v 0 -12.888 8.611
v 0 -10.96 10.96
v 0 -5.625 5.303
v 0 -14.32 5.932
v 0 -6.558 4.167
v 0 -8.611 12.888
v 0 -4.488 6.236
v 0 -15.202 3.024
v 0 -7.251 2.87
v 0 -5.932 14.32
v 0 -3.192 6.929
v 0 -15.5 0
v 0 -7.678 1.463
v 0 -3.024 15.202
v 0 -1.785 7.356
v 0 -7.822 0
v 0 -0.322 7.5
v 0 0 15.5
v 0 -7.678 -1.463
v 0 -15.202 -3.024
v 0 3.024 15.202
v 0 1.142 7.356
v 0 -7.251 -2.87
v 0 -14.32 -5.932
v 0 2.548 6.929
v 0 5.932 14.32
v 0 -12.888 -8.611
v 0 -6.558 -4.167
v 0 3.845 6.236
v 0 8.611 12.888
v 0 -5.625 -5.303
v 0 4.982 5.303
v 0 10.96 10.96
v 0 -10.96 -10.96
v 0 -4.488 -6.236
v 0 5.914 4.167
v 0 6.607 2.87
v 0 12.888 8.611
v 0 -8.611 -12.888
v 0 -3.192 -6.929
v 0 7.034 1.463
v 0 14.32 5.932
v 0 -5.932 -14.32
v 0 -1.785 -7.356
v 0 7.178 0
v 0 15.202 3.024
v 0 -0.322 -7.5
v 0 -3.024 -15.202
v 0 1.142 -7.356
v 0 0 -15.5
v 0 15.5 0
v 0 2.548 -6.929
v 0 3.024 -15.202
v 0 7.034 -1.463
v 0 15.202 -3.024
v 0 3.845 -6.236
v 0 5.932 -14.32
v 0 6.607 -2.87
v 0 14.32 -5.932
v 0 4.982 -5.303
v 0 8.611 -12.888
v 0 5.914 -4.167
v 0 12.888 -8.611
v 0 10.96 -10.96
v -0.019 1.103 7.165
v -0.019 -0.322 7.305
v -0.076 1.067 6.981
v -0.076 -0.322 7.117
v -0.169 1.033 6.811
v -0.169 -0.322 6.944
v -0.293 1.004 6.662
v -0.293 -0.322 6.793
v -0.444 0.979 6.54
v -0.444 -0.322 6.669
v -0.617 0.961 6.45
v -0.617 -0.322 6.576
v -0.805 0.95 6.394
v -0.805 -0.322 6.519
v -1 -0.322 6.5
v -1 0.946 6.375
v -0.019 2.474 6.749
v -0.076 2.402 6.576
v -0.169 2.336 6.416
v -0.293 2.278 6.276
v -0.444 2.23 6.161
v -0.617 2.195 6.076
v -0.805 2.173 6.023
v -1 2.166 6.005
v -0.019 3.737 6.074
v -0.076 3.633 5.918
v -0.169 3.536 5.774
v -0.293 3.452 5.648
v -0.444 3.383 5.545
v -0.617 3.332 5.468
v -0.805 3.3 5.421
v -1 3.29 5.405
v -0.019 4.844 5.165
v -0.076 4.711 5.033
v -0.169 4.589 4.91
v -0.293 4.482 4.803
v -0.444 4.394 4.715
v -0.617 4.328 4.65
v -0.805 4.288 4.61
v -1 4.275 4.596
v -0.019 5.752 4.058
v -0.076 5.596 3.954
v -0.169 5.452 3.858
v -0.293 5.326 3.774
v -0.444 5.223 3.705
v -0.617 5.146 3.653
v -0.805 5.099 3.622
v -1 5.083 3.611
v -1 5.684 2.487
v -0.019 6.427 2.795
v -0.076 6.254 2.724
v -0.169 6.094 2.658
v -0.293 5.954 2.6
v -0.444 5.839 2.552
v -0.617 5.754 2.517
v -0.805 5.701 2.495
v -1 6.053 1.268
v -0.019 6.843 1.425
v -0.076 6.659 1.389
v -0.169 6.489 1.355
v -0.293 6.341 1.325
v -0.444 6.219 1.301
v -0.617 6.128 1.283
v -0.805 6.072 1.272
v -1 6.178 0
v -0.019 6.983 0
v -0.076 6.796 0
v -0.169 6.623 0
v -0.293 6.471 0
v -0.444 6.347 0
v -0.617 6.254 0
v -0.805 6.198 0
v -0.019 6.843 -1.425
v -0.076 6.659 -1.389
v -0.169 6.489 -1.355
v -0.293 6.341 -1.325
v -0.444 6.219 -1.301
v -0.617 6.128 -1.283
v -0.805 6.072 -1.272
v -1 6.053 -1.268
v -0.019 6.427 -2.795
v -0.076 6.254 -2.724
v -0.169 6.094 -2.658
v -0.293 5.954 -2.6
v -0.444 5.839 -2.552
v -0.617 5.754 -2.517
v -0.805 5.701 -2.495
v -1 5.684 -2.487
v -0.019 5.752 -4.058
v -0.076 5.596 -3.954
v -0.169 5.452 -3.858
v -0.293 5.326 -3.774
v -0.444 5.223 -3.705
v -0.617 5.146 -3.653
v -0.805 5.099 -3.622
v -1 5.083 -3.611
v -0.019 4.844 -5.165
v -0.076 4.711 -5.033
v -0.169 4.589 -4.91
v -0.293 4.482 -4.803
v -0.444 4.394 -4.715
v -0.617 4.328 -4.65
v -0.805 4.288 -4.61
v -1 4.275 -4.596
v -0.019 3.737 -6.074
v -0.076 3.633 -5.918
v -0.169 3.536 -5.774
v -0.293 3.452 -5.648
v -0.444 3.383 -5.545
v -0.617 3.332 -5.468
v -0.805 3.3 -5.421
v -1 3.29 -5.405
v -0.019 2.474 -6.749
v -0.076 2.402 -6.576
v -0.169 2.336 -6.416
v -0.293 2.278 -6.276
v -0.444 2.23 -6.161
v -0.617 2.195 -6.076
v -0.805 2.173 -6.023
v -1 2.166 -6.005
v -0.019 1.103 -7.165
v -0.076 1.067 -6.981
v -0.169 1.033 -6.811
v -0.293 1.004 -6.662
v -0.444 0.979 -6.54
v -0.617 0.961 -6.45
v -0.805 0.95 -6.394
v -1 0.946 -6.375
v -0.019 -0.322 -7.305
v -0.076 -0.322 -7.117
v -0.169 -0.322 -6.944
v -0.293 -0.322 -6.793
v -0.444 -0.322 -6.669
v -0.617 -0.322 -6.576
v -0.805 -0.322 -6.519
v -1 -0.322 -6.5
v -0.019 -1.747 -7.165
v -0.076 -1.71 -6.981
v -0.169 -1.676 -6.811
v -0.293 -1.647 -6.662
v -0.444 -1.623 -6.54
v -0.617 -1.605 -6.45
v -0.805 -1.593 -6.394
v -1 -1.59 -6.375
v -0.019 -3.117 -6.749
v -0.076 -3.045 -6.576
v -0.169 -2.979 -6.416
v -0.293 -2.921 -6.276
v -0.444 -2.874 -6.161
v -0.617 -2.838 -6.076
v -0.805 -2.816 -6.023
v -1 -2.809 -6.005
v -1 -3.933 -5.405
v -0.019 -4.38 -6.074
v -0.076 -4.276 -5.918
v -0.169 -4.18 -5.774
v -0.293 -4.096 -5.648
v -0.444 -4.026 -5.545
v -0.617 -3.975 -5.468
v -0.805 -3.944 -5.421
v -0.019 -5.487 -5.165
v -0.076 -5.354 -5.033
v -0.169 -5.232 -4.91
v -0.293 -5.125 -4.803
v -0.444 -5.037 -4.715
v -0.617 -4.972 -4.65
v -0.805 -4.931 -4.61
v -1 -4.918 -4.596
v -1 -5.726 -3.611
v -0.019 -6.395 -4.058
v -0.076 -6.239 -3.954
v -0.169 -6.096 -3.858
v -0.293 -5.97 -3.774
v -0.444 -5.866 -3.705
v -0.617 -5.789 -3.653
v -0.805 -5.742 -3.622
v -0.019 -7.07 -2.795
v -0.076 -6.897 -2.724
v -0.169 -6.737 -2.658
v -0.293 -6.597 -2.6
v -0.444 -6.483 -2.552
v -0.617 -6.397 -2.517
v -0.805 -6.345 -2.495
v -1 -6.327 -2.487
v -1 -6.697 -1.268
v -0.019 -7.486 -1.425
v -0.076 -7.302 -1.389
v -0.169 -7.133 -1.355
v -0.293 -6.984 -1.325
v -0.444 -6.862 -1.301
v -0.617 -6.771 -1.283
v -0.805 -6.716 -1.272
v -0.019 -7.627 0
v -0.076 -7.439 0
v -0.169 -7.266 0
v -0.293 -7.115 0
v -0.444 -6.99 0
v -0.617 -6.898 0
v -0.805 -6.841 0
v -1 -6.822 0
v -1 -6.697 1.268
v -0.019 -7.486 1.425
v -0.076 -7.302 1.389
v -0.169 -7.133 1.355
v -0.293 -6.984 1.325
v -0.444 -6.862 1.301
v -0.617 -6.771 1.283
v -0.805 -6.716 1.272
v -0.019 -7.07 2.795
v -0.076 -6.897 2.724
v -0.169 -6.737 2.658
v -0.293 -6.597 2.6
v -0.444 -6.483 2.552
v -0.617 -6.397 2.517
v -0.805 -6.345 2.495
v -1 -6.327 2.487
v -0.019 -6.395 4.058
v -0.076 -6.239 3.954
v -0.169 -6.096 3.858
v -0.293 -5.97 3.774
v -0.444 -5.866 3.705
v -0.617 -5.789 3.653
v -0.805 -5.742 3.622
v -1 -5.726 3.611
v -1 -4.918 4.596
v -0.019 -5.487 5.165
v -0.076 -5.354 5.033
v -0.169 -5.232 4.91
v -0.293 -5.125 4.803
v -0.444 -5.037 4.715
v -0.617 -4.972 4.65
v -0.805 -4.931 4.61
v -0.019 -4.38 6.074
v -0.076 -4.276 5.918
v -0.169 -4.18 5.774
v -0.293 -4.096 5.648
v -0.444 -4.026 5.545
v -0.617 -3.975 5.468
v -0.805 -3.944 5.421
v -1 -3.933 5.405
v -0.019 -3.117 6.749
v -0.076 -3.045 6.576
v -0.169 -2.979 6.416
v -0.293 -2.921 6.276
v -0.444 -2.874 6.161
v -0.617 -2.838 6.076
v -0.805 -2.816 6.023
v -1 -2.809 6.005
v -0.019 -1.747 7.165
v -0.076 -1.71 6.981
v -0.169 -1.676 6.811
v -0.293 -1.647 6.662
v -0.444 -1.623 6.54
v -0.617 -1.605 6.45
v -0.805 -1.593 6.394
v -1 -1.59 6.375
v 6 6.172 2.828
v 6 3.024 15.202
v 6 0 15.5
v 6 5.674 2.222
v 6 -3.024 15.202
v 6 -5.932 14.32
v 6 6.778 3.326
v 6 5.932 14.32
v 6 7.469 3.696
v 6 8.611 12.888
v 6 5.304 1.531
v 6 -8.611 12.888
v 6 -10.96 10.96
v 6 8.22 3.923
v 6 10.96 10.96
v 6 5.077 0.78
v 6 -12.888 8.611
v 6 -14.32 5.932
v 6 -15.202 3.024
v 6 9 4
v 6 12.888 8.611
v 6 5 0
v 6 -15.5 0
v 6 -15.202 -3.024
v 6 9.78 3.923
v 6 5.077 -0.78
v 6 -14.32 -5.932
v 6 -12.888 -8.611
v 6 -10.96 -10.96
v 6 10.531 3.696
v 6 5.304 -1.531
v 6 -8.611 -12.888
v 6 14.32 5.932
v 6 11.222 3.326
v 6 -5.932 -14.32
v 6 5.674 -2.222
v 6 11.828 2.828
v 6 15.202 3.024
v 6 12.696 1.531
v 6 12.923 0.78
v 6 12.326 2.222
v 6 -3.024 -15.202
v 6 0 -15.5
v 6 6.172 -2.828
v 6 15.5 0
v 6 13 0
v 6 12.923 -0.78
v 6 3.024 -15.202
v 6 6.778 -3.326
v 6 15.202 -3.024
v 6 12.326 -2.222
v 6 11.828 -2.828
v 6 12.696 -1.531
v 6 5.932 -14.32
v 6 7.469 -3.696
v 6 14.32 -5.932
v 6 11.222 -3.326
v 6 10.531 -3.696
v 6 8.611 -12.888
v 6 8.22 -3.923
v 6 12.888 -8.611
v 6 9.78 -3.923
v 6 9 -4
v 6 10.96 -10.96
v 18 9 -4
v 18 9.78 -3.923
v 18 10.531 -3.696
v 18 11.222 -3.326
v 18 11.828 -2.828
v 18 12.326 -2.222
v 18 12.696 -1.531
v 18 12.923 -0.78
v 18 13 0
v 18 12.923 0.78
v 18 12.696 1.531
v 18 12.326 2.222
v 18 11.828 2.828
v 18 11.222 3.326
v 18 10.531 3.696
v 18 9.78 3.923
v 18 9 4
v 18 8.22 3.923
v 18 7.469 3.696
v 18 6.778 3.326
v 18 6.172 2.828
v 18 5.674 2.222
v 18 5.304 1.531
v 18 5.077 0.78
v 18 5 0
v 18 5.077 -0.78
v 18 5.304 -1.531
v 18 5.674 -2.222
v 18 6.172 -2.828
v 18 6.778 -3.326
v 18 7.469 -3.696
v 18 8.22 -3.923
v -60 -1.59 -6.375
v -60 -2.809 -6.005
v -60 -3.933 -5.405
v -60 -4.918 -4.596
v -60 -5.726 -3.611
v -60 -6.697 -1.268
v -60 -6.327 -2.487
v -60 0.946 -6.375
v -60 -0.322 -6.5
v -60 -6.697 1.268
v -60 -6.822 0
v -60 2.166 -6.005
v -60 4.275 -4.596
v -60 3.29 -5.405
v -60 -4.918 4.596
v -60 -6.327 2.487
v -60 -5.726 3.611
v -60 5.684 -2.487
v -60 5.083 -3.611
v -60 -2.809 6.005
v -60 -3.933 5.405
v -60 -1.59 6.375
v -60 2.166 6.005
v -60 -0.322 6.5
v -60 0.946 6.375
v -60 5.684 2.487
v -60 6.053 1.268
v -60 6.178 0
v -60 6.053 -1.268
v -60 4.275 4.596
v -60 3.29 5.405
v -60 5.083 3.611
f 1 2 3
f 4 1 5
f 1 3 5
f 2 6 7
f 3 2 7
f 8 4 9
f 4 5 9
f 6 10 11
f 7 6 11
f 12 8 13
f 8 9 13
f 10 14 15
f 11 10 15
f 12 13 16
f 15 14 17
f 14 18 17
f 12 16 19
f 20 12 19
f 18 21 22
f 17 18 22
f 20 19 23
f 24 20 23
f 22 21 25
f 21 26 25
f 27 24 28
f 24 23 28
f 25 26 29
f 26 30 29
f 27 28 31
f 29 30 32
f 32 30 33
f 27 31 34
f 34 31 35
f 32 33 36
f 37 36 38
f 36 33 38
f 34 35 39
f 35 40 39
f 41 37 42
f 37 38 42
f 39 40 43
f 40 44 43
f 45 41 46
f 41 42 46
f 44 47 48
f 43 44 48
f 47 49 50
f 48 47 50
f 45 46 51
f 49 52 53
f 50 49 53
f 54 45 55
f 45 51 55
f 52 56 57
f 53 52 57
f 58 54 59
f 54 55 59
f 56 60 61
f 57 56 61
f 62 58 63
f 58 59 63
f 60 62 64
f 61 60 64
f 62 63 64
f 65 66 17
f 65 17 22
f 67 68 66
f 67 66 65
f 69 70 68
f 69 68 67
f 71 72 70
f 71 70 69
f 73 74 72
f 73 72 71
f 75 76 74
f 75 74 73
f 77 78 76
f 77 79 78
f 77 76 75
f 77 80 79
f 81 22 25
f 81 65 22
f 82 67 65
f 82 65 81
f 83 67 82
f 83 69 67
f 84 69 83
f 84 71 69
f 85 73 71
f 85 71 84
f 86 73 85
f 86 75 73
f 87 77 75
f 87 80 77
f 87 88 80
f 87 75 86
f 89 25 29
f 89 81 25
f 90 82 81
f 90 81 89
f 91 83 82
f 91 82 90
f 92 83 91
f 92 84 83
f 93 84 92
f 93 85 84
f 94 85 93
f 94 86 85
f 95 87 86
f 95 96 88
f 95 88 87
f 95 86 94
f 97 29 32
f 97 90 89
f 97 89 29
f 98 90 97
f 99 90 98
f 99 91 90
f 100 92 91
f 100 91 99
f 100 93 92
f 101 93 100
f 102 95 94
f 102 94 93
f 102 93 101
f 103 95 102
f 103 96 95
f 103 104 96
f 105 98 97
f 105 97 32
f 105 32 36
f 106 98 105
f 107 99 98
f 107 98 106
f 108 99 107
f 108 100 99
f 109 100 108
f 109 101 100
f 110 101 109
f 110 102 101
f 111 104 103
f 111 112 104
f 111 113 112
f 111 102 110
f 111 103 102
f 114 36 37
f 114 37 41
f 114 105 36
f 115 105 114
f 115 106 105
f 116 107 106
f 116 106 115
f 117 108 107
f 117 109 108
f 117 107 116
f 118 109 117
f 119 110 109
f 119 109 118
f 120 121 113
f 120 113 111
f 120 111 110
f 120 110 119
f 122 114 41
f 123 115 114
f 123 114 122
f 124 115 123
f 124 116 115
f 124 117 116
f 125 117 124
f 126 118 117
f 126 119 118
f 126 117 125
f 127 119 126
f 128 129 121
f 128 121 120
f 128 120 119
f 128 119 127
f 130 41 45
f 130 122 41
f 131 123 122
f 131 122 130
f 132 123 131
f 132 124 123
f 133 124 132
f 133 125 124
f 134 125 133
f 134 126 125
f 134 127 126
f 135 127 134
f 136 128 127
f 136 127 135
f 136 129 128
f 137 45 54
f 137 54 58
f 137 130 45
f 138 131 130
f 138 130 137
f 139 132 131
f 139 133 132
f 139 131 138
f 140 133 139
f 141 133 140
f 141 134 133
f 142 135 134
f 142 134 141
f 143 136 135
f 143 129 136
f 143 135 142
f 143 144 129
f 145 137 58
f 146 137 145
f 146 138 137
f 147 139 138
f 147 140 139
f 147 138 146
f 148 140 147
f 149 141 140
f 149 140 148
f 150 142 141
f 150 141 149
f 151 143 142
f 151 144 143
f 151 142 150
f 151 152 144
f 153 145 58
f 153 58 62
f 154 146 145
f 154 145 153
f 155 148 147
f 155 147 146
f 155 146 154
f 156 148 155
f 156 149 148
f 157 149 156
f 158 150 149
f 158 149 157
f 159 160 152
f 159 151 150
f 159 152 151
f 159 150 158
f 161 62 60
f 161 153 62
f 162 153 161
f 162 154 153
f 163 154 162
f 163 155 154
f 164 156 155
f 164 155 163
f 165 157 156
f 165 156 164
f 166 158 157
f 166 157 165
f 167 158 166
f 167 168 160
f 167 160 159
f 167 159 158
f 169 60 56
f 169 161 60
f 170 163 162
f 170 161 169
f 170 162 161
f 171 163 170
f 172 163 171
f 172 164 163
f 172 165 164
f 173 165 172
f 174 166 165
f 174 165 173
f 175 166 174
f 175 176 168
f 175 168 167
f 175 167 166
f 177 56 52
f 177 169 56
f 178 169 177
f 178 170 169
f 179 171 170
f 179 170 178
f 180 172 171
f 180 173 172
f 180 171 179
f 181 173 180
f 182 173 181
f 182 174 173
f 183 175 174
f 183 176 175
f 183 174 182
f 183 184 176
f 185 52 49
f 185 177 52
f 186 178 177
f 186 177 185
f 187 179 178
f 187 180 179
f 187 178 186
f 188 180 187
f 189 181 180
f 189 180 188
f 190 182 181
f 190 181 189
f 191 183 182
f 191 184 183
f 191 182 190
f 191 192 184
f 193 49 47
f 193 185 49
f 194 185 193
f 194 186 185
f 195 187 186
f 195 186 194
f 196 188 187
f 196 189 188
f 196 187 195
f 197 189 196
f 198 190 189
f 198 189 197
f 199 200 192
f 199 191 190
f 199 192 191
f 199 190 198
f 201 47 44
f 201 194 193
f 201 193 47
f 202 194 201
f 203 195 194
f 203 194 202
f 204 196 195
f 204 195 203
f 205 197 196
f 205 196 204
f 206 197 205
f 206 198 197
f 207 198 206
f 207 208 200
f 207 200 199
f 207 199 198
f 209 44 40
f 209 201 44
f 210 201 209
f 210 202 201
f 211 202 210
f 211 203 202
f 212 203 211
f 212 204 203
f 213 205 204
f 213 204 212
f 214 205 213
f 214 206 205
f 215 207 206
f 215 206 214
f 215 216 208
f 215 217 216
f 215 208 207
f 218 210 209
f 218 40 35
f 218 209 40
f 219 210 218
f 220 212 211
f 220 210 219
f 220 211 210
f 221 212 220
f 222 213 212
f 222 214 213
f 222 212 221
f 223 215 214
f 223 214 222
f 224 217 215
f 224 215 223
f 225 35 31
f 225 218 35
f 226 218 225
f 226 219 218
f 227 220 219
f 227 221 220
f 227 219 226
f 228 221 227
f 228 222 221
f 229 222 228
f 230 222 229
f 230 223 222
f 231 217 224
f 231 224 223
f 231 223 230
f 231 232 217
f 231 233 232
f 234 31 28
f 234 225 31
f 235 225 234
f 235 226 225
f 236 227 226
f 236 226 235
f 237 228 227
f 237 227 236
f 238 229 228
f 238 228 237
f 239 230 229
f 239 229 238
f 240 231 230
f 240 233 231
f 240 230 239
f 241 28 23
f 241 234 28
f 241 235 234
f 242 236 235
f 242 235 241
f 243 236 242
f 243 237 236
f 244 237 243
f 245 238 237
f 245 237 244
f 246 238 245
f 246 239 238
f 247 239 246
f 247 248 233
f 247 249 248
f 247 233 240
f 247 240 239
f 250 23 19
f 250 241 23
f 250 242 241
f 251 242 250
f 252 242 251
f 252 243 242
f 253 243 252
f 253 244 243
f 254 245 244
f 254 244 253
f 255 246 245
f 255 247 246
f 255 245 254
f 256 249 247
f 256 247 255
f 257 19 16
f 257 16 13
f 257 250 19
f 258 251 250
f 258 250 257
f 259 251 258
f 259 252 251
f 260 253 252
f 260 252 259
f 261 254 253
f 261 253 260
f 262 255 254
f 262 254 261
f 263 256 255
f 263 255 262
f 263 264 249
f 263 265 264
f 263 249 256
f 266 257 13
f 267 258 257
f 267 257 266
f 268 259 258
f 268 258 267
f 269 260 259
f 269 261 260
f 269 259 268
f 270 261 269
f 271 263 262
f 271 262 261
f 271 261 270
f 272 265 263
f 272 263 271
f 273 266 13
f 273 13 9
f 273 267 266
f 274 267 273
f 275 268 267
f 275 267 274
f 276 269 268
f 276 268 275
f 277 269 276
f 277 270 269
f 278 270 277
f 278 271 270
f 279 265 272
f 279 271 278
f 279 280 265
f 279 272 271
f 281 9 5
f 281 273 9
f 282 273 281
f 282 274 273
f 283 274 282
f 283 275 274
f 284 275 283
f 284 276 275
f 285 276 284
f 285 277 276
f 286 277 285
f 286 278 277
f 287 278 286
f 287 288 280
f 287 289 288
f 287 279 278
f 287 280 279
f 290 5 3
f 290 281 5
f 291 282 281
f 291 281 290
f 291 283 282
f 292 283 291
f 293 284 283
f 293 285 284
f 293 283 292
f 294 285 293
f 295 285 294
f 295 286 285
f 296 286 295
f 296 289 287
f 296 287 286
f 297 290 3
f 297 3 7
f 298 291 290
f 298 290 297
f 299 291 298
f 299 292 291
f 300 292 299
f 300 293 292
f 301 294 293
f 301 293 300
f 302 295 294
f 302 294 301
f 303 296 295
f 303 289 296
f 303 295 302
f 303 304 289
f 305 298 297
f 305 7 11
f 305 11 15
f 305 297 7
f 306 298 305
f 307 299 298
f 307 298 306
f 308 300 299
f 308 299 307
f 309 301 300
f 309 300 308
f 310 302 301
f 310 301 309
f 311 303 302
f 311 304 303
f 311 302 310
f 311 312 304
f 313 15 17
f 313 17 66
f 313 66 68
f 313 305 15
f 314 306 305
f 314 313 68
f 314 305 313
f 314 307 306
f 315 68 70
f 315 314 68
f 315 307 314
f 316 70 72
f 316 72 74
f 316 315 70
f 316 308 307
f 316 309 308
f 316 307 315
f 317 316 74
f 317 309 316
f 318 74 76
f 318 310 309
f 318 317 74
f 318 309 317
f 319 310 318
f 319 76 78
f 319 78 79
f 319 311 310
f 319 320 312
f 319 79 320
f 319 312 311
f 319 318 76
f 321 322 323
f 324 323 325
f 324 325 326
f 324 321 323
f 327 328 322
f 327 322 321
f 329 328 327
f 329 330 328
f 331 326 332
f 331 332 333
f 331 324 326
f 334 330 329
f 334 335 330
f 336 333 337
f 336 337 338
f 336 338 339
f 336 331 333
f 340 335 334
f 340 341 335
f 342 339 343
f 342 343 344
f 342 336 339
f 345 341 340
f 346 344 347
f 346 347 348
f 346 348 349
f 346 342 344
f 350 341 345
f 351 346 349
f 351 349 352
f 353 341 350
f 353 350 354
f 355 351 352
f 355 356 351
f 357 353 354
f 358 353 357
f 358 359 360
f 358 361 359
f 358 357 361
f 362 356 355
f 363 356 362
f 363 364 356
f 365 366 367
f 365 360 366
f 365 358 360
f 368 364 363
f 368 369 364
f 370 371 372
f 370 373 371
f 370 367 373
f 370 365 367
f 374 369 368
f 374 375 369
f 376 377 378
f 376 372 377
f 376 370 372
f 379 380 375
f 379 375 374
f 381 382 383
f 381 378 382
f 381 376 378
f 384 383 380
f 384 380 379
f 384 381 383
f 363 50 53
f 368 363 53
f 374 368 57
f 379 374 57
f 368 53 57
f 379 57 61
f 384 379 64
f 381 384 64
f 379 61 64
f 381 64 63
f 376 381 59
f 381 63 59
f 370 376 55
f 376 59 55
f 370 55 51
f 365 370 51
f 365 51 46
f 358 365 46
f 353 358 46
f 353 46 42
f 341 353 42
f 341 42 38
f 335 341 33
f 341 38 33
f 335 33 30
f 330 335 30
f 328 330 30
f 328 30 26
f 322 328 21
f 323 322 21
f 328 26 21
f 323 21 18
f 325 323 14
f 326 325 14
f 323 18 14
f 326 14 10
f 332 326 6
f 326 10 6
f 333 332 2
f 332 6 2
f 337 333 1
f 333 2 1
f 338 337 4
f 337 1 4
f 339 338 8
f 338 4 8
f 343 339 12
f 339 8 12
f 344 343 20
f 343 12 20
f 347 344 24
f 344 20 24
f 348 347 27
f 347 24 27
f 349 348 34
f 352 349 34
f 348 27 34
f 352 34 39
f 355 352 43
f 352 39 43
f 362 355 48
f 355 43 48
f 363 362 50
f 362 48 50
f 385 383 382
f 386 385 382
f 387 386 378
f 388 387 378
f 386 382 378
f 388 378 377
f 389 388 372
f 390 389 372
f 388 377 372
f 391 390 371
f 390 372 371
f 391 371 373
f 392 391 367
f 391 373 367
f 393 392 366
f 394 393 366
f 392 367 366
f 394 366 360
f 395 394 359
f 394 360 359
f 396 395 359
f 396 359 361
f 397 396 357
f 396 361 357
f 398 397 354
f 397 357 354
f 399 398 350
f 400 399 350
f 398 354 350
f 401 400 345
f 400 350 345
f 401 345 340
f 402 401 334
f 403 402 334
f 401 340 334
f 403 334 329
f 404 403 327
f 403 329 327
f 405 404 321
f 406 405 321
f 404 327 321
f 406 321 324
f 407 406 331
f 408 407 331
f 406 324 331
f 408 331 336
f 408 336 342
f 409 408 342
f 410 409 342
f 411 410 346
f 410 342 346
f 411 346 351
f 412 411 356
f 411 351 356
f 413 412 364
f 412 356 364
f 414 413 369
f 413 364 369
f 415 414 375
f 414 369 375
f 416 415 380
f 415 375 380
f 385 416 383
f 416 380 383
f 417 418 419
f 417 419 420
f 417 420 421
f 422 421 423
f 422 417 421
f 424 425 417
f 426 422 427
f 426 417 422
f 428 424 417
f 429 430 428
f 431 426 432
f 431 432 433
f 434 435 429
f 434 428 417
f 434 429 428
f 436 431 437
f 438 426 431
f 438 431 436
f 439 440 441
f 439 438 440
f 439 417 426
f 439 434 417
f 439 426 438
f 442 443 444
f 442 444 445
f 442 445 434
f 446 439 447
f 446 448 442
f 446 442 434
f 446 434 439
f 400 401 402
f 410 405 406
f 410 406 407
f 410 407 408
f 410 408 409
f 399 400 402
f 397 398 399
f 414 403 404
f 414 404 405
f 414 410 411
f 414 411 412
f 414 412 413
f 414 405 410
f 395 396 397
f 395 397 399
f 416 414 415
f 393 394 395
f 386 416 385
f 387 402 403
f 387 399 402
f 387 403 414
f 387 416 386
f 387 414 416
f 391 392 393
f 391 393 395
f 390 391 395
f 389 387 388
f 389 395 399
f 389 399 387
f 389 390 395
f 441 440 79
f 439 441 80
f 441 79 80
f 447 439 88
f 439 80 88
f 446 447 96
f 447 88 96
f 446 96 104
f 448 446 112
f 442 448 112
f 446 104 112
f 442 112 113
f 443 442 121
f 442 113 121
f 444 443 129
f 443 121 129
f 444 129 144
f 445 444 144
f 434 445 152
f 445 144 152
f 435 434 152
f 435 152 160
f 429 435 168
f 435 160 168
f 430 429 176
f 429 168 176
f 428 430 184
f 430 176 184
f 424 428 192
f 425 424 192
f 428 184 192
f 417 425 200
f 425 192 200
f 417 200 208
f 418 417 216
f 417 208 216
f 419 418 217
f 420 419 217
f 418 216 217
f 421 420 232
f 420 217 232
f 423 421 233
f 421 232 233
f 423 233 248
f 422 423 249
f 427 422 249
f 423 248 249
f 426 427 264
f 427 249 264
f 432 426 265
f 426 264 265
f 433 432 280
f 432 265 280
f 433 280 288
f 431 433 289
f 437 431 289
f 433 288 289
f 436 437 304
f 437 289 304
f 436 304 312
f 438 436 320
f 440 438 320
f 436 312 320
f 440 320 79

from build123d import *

# Parameters (mm, degrees)
SKETCH1_R           = 15.5
BOSS_EXTRUDE1_DEPTH = 6
SKETCH2_R           = 6.5
BOSS_EXTRUDE2_DEPTH = 60
FILLET1_R           = 1
SKETCH3_R           = 4
BOSS_EXTRUDE3_DEPTH = 12


with BuildPart() as part:
    # Sketch1 → Boss-Extrude1 (new body)
    with BuildSketch(Plane(origin=(0, 0, 0), x_dir=(0, 0, -1), z_dir=(1, 0, 0))):
        Circle(SKETCH1_R)
    extrude(amount=BOSS_EXTRUDE1_DEPTH)

    # Sketch2 → Boss-Extrude2 (add)
    with BuildSketch(Plane.ZY):
        with Locations((0, -0.321626653)):
            Circle(SKETCH2_R)
    extrude(amount=BOSS_EXTRUDE2_DEPTH)

    # Fillet1
    fillet1_edges = [part.edges().sort_by_distance(p)[0] for p in [
        (0, -0.321626653, -6.5),
    ]]
    fillet(fillet1_edges, radius=FILLET1_R)

    # Sketch3 → Boss-Extrude3 (add)
    with BuildSketch(Plane(origin=(6, 0, 0), x_dir=(0, 0, -1), z_dir=(1, 0, 0))):
        with Locations((0, 9)):
            Circle(SKETCH3_R)
    extrude(amount=BOSS_EXTRUDE3_DEPTH)


solid = part.part
